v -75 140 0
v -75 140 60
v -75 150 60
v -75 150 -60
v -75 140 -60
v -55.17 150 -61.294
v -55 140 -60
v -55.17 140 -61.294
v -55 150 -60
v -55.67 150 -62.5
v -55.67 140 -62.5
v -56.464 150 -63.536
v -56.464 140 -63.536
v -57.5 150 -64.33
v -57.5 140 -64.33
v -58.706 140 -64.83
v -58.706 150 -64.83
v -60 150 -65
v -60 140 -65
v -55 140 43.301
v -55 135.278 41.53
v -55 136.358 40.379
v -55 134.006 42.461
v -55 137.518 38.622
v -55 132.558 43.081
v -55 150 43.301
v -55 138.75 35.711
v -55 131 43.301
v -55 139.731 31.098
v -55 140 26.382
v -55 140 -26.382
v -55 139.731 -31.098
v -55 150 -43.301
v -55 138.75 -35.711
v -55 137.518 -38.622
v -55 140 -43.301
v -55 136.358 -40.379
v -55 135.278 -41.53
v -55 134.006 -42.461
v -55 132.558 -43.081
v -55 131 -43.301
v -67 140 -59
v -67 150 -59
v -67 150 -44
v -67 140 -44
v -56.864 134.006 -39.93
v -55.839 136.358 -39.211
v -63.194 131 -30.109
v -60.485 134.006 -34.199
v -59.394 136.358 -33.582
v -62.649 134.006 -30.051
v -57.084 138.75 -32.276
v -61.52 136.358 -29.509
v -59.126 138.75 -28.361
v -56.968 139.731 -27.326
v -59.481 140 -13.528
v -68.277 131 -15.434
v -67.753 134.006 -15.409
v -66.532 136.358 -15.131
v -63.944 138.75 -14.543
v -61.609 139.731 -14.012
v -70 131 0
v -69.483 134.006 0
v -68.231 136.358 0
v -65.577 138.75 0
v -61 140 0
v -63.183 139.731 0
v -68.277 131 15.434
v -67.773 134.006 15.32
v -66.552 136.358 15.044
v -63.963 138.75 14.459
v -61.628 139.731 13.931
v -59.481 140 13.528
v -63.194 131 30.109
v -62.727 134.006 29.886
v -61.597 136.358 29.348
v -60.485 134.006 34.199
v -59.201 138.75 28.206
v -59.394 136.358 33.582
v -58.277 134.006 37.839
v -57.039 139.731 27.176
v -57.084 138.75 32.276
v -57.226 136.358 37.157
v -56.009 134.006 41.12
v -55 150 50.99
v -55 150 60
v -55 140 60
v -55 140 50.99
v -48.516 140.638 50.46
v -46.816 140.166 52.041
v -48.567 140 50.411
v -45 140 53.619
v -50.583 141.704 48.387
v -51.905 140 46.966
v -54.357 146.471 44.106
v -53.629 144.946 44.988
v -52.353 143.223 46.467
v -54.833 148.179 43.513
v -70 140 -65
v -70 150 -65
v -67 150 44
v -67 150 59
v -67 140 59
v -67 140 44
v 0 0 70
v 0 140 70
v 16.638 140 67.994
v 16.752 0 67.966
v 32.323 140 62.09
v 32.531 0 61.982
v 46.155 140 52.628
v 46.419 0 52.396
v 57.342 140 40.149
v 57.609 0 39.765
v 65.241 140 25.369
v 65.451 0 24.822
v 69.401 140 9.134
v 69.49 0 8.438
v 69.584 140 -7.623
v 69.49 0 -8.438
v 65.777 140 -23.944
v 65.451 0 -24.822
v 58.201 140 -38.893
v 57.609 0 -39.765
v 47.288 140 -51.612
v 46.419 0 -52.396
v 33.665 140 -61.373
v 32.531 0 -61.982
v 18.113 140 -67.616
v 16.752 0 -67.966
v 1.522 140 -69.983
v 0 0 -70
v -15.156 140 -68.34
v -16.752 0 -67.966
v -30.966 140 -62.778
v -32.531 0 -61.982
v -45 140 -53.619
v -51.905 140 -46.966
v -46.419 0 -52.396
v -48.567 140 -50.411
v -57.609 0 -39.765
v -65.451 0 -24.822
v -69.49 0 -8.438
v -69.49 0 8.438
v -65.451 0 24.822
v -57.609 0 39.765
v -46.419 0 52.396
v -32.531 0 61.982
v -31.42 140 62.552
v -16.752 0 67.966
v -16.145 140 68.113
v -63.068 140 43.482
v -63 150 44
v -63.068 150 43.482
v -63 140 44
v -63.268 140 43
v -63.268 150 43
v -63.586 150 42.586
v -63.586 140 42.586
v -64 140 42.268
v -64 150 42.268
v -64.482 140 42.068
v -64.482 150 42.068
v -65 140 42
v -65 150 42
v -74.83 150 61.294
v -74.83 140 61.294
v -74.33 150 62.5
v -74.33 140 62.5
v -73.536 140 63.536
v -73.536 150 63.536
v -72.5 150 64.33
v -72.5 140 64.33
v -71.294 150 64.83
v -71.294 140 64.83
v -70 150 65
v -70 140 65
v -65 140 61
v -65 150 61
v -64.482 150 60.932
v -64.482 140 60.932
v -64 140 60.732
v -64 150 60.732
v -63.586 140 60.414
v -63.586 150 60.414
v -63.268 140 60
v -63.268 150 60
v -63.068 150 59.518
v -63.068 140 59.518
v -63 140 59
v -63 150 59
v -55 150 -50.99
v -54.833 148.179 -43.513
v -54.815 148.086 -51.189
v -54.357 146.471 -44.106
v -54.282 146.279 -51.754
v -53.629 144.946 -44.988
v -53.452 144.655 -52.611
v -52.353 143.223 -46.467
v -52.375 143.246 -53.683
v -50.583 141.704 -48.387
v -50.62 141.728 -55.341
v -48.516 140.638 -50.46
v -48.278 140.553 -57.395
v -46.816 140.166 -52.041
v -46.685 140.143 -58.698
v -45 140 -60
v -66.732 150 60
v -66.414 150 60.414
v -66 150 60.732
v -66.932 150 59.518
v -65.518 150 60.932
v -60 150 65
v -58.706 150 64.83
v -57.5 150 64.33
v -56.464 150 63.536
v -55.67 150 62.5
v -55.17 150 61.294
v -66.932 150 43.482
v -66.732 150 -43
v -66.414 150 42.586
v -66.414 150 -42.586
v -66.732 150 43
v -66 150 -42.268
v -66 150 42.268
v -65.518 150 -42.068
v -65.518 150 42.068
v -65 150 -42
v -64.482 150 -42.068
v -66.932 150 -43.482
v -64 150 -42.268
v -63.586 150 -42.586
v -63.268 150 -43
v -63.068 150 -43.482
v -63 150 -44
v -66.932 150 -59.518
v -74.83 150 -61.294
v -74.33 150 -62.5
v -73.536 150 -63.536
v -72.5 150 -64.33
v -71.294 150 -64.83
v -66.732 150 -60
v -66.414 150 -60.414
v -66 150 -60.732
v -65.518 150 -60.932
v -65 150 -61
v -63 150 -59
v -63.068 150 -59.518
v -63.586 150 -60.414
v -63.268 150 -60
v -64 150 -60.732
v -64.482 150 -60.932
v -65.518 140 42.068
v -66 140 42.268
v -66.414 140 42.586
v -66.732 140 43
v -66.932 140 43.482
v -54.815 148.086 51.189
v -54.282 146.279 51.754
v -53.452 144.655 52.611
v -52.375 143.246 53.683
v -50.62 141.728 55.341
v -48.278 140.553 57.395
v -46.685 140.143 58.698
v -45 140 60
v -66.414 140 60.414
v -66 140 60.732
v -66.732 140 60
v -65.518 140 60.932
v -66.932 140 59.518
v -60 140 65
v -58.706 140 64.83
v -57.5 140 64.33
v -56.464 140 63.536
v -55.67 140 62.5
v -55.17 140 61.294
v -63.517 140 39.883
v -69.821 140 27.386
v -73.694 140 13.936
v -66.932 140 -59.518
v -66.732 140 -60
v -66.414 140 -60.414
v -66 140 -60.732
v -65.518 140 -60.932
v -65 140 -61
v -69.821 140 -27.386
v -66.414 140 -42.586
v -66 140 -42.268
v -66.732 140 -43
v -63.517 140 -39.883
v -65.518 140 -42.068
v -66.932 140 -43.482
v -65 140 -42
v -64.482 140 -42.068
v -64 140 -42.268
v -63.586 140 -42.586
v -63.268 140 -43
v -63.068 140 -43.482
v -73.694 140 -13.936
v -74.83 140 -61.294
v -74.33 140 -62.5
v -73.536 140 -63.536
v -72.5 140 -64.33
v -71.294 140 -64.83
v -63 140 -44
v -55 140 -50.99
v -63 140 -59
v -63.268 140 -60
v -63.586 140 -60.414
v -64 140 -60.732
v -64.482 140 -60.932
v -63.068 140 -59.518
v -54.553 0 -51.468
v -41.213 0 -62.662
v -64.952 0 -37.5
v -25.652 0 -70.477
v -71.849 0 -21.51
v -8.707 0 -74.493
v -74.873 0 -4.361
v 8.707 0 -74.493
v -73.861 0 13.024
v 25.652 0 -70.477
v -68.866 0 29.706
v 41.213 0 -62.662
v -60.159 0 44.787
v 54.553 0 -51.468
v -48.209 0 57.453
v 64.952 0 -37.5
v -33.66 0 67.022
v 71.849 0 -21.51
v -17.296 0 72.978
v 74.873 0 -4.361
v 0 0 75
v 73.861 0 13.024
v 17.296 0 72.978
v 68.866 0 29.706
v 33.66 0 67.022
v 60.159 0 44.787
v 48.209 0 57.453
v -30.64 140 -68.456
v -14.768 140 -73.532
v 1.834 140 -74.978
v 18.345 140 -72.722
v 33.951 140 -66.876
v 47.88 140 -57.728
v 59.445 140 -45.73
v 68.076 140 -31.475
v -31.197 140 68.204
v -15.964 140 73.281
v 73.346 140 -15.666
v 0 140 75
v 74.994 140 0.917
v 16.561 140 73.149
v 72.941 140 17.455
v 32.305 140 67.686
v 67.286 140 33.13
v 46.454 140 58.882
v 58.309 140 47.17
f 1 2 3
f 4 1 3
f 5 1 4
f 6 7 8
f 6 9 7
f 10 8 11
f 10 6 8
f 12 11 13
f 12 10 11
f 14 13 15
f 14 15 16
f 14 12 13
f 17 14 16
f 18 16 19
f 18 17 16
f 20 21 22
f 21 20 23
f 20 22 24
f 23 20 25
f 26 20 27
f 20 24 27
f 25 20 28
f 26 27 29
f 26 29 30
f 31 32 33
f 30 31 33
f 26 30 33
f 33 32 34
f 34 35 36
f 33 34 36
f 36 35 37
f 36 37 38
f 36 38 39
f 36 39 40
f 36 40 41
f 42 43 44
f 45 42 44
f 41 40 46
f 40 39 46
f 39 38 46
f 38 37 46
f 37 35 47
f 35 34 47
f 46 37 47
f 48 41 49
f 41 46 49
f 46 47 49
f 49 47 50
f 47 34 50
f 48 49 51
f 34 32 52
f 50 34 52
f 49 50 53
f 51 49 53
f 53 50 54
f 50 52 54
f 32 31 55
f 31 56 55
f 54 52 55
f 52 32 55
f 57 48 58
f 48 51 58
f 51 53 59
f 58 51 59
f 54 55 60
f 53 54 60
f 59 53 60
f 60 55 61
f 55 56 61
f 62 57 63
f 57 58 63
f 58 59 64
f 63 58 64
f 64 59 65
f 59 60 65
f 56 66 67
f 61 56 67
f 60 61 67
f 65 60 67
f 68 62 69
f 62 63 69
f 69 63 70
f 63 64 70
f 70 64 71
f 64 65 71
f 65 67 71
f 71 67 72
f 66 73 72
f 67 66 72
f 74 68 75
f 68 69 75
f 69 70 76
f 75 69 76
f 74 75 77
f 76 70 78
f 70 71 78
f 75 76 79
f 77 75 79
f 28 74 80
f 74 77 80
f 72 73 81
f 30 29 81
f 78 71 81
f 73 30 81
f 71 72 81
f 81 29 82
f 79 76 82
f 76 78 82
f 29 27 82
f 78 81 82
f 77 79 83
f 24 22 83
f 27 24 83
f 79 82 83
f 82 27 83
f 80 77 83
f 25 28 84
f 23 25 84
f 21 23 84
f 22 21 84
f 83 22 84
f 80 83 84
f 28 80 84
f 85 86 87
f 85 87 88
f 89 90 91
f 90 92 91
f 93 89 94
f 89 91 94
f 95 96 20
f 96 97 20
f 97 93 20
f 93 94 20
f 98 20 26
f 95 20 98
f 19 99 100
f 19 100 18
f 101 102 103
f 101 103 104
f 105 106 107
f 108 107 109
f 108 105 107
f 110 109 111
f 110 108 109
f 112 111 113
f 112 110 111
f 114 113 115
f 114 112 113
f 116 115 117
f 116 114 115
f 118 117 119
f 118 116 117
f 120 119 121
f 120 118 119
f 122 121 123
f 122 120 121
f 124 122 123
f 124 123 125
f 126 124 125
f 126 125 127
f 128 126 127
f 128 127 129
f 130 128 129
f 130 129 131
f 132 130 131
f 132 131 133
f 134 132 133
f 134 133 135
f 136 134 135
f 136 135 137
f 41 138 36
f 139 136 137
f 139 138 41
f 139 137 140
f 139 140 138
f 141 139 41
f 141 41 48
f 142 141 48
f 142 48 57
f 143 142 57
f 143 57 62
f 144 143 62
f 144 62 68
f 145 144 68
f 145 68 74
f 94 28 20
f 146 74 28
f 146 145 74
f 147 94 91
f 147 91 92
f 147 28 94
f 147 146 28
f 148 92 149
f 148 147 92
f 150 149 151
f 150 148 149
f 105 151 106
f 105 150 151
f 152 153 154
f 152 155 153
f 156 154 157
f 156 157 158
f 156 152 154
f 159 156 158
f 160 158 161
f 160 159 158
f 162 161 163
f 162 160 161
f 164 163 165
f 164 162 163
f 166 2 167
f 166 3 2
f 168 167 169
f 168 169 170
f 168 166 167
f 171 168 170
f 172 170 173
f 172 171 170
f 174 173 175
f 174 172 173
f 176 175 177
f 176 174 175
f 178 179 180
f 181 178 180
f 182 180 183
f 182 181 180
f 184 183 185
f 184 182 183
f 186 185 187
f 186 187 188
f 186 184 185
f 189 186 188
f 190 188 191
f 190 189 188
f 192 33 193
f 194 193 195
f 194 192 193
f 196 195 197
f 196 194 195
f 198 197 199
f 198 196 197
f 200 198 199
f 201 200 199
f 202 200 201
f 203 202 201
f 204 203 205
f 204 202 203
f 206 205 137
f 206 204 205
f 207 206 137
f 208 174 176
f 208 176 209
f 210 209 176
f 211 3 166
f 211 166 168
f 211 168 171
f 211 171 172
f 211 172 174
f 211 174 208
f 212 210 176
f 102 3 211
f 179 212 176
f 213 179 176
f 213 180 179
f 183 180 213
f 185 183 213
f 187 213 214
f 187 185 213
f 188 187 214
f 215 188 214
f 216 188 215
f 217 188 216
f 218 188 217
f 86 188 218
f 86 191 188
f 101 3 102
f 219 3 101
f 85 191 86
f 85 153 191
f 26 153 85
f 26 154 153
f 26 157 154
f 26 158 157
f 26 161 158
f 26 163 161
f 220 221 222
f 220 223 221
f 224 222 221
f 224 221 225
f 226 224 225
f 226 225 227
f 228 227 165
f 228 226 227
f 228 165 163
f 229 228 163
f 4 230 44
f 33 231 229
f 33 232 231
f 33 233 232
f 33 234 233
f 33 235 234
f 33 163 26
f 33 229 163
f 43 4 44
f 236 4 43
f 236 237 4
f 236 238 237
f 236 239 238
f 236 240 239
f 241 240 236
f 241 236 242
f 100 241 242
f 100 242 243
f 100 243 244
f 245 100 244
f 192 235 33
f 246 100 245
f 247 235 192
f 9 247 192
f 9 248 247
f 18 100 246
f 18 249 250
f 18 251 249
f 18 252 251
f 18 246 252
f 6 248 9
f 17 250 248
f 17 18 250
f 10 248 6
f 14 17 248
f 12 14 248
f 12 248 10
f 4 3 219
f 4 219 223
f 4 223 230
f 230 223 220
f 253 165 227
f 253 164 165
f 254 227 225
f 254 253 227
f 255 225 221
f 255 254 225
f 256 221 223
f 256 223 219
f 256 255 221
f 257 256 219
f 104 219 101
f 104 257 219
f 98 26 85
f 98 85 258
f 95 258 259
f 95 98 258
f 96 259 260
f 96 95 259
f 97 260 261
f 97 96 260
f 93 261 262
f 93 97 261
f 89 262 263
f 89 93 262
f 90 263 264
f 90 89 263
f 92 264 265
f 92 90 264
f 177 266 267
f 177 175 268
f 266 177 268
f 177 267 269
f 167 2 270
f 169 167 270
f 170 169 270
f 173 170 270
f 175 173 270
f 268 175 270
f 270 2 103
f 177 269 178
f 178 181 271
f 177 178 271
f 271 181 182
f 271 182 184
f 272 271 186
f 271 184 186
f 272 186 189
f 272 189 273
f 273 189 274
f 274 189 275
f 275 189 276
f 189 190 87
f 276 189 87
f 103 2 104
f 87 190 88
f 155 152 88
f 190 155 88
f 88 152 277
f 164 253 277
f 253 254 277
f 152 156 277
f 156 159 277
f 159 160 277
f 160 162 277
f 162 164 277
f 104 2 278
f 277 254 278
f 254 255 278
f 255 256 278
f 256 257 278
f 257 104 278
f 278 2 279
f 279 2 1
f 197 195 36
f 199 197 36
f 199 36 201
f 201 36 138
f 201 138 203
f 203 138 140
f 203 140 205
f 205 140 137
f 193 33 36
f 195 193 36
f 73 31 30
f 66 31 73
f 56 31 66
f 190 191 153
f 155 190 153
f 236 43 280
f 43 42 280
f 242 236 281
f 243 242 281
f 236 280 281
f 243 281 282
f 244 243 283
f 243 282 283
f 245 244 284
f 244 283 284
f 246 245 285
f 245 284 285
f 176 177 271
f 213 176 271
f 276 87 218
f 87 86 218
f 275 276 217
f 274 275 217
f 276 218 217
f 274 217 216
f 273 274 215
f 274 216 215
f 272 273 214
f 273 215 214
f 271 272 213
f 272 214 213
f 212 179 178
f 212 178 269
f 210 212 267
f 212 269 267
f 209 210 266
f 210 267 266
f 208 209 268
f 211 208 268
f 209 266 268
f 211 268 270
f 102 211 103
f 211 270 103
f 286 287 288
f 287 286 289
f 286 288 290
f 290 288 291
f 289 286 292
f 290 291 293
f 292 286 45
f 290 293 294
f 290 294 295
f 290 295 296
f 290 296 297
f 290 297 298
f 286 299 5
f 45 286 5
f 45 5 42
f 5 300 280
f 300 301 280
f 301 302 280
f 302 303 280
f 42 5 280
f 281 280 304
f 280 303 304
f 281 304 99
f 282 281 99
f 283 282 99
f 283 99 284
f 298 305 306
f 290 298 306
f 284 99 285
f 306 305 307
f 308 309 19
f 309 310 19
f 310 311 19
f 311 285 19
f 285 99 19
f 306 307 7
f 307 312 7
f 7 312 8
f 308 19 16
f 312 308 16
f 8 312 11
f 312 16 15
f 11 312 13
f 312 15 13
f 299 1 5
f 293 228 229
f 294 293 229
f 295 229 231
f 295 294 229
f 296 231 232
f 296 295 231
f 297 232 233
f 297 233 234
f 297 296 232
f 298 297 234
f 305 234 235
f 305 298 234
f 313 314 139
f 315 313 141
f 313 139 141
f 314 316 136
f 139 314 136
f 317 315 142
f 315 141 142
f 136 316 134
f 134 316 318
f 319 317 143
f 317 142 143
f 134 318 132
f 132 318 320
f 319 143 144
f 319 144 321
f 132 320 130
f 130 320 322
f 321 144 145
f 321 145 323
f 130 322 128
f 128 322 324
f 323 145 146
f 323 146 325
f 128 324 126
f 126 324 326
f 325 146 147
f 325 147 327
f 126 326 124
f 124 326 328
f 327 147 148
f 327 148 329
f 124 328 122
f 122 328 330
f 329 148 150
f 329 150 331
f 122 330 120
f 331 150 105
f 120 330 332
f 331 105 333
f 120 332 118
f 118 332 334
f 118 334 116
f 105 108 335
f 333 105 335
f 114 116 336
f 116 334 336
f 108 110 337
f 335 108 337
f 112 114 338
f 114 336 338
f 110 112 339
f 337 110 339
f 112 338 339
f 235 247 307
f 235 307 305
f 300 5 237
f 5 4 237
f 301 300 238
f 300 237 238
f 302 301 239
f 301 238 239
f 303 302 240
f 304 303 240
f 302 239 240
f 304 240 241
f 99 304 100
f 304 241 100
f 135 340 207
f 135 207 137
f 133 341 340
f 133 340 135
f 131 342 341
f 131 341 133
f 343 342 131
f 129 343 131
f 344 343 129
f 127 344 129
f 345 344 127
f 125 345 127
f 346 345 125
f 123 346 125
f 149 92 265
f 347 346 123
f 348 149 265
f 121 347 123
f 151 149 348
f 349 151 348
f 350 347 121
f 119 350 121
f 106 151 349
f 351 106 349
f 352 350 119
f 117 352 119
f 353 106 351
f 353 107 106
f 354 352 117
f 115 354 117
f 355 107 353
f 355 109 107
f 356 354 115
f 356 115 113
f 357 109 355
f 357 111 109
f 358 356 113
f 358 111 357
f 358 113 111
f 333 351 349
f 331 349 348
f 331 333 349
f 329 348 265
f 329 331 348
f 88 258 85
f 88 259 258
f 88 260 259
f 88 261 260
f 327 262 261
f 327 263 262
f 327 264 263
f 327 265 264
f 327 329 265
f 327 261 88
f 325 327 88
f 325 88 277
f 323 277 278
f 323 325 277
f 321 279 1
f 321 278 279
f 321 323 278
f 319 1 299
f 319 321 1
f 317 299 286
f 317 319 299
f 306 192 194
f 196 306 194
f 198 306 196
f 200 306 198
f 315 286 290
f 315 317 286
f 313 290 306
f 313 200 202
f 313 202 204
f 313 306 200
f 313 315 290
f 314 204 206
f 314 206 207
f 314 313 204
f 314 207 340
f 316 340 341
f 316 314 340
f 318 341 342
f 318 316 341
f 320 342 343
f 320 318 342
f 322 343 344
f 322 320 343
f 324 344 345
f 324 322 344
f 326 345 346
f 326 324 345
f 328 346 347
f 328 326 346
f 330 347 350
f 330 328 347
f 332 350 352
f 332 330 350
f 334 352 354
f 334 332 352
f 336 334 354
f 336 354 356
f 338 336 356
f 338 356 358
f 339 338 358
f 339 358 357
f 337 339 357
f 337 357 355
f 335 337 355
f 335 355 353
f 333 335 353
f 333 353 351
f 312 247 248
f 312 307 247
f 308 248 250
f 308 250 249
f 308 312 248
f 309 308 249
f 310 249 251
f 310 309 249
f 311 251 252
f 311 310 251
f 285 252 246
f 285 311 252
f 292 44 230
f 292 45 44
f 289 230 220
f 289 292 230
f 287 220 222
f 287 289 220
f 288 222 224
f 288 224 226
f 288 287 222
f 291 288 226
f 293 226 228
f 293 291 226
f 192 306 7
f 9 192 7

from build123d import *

# Parameters (mm, degrees)
SKETCH1_R            = 75
SKETCH1_R_2          = 70
BOSS_EXTRUDE1_DEPTH  = 140
SKETCH2_W            = 20
SKETCH2_H            = 130
BOSS_EXTRUDE2_DEPTH  = 10
FILLET1_R            = 9
FILLET2_R            = 10
FILLET3_R            = 5
SKETCH5_W            = 4
SKETCH5_H            = 19
CUT_EXTRUDE1_DEPTH   = 10
FILLET4_R            = 2
FILLET4_OF_MIRROR4_R = 2


# Some blends are built 0.0001 mm under size
with BuildPart() as part:
    # Sketch1 → Boss-Extrude1 (new body)
    with BuildSketch(Plane(origin=(0, 0, 0), x_dir=(1, 0, 0), z_dir=(0, 1, 0))):
        with Locations(Location((0, 0, 0), (0, 0, 270))):
            Circle(SKETCH1_R)
        with Locations(Location((0, 0, 0), (0, 0, 270))):
            Circle(SKETCH1_R_2, mode=Mode.SUBTRACT)
    extrude(amount=BOSS_EXTRUDE1_DEPTH)

    # Sketch2 → Boss-Extrude2 (add)
    with BuildSketch(Plane(origin=(0, 140, 0), x_dir=(1, 0, 0), z_dir=(0, 1, 0))):
        with Locations((-65, 0)):
            Rectangle(SKETCH2_W, SKETCH2_H)
    extrude(amount=BOSS_EXTRUDE2_DEPTH)

    # Fillet1
    # the kernel refuses this fillet: 9 mm, written as the material it adds along each edge
    with BuildSketch(Plane(origin=(0, 140, 0), x_dir=(-0.5499699922766536, 0, -0.835184415321082), z_dir=(0.835184415321082, 0, -0.5499699922766536))) as fillet1_piece_1_section:
        with BuildLine():
            CenterArc((70 - FILLET1_R, -FILLET1_R), FILLET1_R, 0, 90)
            Line((70 - FILLET1_R, 0), (70, 0))
            Line((70, 0), (70, -FILLET1_R))
        make_face()
    fillet1_piece_1 = revolve(axis=Axis((0, 140, 0), (0, 1, 0)), revolution_arc=113.270091323, mode=Mode.PRIVATE)
    fillet1_piece_1 = split(fillet1_piece_1, bisect_by=Plane(origin=(-55, 137.444603365, 0), z_dir=(-1, 0, 0)), keep=Keep.TOP, mode=Mode.PRIVATE)
    add(fillet1_piece_1)

    # Fillet2
    # the kernel refuses this fillet: 10 mm, written as the material it adds along each edge
    with BuildSketch(Plane(origin=(-55, 140, -75.990195136), x_dir=(0, 1, 0), z_dir=(0, 0, 1))) as fillet2_piece_1_section:
        with BuildLine():
            CenterArc((FILLET2_R, -FILLET2_R), FILLET2_R, 90, 90)
            Line((0, -FILLET2_R), (0, 0))
            Line((0, 0), (FILLET2_R, 0))
        make_face()
    fillet2_piece_1 = extrude(amount=57.688924947, mode=Mode.PRIVATE)
    fillet2_piece_1 = fillet2_piece_1 - Plane(origin=(0, 142.276585478, 0), x_dir=(0, 0, 1), z_dir=(0, -1, 0)) * Cylinder(70, 156, mode=Mode.PRIVATE)
    fillet2_piece_1 = fillet2_piece_1 & Plane(origin=(0, 142.276585478, 0), x_dir=(0, 0, 1), z_dir=(0, -1, 0)) * Cylinder(75, 156, mode=Mode.PRIVATE)
    add(fillet2_piece_1)
    with BuildSketch(Plane(origin=(-55, 140, 18.301270189), x_dir=(0, 1, 0), z_dir=(0, 0, 1))) as fillet2_piece_2_section:
        with BuildLine():
            CenterArc((FILLET2_R, -FILLET2_R), FILLET2_R, 90, 90)
            Line((0, -FILLET2_R), (0, 0))
            Line((0, 0), (FILLET2_R, 0))
        make_face()
    fillet2_piece_2 = extrude(amount=57.688924947, mode=Mode.PRIVATE)
    fillet2_piece_2 = fillet2_piece_2 - Plane(origin=(0, 142.276601392, 0), x_dir=(0, 0, 1), z_dir=(0, -1, 0)) * Cylinder(70, 156, mode=Mode.PRIVATE)
    fillet2_piece_2 = fillet2_piece_2 & Plane(origin=(0, 142.276601392, 0), x_dir=(0, 0, 1), z_dir=(0, -1, 0)) * Cylinder(75, 156, mode=Mode.PRIVATE)
    add(fillet2_piece_2)

    # Fillet3
    fillet3_edges = [part.edges().sort_by_distance(p)[0] for p in [
        (-75, 145, -65),
        (-75, 145, 65),
        (-55, 145, 65),
        (-55, 145, -65),
    ]]
    fillet(fillet3_edges, radius=FILLET3_R)

    # Sketch5 → Cut-Extrude1 (cut)
    with BuildSketch(Plane(origin=(0, 150, 0), x_dir=(1, 0, 0), z_dir=(0, 1, 0))):
        with Locations((-65, -51.5)):
            Rectangle(SKETCH5_W, SKETCH5_H)
    cut_extrude1 = extrude(amount=-CUT_EXTRUDE1_DEPTH, mode=Mode.SUBTRACT)

    # Fillet4
    fillet4_edges = [part.edges().sort_by_distance(p)[0] for p in [
        (-67, 145, 42),
        (-63, 145, 42),
        (-67, 145, 61),
        (-63, 145, 61),
    ]]
    fillet(fillet4_edges, radius=FILLET4_R - 0.0001)  # a hair under: the kernel refuses the full size

    # Mirror4: Cut-Extrude1 across plane
    add(cut_extrude1.mirror(Plane.XY), mode=Mode.SUBTRACT)

    # Fillet4 of Mirror4
    fillet4_of_mirror4_edges = [part.edges().sort_by_distance(p)[0] for p in [
        (-67, 145, -42),
        (-63, 145, -42),
        (-67, 145, -61),
        (-63, 145, -61),
    ]]
    fillet(fillet4_of_mirror4_edges, radius=FILLET4_OF_MIRROR4_R - 0.0001)  # a hair under: the kernel refuses the full size


solid = part.part
